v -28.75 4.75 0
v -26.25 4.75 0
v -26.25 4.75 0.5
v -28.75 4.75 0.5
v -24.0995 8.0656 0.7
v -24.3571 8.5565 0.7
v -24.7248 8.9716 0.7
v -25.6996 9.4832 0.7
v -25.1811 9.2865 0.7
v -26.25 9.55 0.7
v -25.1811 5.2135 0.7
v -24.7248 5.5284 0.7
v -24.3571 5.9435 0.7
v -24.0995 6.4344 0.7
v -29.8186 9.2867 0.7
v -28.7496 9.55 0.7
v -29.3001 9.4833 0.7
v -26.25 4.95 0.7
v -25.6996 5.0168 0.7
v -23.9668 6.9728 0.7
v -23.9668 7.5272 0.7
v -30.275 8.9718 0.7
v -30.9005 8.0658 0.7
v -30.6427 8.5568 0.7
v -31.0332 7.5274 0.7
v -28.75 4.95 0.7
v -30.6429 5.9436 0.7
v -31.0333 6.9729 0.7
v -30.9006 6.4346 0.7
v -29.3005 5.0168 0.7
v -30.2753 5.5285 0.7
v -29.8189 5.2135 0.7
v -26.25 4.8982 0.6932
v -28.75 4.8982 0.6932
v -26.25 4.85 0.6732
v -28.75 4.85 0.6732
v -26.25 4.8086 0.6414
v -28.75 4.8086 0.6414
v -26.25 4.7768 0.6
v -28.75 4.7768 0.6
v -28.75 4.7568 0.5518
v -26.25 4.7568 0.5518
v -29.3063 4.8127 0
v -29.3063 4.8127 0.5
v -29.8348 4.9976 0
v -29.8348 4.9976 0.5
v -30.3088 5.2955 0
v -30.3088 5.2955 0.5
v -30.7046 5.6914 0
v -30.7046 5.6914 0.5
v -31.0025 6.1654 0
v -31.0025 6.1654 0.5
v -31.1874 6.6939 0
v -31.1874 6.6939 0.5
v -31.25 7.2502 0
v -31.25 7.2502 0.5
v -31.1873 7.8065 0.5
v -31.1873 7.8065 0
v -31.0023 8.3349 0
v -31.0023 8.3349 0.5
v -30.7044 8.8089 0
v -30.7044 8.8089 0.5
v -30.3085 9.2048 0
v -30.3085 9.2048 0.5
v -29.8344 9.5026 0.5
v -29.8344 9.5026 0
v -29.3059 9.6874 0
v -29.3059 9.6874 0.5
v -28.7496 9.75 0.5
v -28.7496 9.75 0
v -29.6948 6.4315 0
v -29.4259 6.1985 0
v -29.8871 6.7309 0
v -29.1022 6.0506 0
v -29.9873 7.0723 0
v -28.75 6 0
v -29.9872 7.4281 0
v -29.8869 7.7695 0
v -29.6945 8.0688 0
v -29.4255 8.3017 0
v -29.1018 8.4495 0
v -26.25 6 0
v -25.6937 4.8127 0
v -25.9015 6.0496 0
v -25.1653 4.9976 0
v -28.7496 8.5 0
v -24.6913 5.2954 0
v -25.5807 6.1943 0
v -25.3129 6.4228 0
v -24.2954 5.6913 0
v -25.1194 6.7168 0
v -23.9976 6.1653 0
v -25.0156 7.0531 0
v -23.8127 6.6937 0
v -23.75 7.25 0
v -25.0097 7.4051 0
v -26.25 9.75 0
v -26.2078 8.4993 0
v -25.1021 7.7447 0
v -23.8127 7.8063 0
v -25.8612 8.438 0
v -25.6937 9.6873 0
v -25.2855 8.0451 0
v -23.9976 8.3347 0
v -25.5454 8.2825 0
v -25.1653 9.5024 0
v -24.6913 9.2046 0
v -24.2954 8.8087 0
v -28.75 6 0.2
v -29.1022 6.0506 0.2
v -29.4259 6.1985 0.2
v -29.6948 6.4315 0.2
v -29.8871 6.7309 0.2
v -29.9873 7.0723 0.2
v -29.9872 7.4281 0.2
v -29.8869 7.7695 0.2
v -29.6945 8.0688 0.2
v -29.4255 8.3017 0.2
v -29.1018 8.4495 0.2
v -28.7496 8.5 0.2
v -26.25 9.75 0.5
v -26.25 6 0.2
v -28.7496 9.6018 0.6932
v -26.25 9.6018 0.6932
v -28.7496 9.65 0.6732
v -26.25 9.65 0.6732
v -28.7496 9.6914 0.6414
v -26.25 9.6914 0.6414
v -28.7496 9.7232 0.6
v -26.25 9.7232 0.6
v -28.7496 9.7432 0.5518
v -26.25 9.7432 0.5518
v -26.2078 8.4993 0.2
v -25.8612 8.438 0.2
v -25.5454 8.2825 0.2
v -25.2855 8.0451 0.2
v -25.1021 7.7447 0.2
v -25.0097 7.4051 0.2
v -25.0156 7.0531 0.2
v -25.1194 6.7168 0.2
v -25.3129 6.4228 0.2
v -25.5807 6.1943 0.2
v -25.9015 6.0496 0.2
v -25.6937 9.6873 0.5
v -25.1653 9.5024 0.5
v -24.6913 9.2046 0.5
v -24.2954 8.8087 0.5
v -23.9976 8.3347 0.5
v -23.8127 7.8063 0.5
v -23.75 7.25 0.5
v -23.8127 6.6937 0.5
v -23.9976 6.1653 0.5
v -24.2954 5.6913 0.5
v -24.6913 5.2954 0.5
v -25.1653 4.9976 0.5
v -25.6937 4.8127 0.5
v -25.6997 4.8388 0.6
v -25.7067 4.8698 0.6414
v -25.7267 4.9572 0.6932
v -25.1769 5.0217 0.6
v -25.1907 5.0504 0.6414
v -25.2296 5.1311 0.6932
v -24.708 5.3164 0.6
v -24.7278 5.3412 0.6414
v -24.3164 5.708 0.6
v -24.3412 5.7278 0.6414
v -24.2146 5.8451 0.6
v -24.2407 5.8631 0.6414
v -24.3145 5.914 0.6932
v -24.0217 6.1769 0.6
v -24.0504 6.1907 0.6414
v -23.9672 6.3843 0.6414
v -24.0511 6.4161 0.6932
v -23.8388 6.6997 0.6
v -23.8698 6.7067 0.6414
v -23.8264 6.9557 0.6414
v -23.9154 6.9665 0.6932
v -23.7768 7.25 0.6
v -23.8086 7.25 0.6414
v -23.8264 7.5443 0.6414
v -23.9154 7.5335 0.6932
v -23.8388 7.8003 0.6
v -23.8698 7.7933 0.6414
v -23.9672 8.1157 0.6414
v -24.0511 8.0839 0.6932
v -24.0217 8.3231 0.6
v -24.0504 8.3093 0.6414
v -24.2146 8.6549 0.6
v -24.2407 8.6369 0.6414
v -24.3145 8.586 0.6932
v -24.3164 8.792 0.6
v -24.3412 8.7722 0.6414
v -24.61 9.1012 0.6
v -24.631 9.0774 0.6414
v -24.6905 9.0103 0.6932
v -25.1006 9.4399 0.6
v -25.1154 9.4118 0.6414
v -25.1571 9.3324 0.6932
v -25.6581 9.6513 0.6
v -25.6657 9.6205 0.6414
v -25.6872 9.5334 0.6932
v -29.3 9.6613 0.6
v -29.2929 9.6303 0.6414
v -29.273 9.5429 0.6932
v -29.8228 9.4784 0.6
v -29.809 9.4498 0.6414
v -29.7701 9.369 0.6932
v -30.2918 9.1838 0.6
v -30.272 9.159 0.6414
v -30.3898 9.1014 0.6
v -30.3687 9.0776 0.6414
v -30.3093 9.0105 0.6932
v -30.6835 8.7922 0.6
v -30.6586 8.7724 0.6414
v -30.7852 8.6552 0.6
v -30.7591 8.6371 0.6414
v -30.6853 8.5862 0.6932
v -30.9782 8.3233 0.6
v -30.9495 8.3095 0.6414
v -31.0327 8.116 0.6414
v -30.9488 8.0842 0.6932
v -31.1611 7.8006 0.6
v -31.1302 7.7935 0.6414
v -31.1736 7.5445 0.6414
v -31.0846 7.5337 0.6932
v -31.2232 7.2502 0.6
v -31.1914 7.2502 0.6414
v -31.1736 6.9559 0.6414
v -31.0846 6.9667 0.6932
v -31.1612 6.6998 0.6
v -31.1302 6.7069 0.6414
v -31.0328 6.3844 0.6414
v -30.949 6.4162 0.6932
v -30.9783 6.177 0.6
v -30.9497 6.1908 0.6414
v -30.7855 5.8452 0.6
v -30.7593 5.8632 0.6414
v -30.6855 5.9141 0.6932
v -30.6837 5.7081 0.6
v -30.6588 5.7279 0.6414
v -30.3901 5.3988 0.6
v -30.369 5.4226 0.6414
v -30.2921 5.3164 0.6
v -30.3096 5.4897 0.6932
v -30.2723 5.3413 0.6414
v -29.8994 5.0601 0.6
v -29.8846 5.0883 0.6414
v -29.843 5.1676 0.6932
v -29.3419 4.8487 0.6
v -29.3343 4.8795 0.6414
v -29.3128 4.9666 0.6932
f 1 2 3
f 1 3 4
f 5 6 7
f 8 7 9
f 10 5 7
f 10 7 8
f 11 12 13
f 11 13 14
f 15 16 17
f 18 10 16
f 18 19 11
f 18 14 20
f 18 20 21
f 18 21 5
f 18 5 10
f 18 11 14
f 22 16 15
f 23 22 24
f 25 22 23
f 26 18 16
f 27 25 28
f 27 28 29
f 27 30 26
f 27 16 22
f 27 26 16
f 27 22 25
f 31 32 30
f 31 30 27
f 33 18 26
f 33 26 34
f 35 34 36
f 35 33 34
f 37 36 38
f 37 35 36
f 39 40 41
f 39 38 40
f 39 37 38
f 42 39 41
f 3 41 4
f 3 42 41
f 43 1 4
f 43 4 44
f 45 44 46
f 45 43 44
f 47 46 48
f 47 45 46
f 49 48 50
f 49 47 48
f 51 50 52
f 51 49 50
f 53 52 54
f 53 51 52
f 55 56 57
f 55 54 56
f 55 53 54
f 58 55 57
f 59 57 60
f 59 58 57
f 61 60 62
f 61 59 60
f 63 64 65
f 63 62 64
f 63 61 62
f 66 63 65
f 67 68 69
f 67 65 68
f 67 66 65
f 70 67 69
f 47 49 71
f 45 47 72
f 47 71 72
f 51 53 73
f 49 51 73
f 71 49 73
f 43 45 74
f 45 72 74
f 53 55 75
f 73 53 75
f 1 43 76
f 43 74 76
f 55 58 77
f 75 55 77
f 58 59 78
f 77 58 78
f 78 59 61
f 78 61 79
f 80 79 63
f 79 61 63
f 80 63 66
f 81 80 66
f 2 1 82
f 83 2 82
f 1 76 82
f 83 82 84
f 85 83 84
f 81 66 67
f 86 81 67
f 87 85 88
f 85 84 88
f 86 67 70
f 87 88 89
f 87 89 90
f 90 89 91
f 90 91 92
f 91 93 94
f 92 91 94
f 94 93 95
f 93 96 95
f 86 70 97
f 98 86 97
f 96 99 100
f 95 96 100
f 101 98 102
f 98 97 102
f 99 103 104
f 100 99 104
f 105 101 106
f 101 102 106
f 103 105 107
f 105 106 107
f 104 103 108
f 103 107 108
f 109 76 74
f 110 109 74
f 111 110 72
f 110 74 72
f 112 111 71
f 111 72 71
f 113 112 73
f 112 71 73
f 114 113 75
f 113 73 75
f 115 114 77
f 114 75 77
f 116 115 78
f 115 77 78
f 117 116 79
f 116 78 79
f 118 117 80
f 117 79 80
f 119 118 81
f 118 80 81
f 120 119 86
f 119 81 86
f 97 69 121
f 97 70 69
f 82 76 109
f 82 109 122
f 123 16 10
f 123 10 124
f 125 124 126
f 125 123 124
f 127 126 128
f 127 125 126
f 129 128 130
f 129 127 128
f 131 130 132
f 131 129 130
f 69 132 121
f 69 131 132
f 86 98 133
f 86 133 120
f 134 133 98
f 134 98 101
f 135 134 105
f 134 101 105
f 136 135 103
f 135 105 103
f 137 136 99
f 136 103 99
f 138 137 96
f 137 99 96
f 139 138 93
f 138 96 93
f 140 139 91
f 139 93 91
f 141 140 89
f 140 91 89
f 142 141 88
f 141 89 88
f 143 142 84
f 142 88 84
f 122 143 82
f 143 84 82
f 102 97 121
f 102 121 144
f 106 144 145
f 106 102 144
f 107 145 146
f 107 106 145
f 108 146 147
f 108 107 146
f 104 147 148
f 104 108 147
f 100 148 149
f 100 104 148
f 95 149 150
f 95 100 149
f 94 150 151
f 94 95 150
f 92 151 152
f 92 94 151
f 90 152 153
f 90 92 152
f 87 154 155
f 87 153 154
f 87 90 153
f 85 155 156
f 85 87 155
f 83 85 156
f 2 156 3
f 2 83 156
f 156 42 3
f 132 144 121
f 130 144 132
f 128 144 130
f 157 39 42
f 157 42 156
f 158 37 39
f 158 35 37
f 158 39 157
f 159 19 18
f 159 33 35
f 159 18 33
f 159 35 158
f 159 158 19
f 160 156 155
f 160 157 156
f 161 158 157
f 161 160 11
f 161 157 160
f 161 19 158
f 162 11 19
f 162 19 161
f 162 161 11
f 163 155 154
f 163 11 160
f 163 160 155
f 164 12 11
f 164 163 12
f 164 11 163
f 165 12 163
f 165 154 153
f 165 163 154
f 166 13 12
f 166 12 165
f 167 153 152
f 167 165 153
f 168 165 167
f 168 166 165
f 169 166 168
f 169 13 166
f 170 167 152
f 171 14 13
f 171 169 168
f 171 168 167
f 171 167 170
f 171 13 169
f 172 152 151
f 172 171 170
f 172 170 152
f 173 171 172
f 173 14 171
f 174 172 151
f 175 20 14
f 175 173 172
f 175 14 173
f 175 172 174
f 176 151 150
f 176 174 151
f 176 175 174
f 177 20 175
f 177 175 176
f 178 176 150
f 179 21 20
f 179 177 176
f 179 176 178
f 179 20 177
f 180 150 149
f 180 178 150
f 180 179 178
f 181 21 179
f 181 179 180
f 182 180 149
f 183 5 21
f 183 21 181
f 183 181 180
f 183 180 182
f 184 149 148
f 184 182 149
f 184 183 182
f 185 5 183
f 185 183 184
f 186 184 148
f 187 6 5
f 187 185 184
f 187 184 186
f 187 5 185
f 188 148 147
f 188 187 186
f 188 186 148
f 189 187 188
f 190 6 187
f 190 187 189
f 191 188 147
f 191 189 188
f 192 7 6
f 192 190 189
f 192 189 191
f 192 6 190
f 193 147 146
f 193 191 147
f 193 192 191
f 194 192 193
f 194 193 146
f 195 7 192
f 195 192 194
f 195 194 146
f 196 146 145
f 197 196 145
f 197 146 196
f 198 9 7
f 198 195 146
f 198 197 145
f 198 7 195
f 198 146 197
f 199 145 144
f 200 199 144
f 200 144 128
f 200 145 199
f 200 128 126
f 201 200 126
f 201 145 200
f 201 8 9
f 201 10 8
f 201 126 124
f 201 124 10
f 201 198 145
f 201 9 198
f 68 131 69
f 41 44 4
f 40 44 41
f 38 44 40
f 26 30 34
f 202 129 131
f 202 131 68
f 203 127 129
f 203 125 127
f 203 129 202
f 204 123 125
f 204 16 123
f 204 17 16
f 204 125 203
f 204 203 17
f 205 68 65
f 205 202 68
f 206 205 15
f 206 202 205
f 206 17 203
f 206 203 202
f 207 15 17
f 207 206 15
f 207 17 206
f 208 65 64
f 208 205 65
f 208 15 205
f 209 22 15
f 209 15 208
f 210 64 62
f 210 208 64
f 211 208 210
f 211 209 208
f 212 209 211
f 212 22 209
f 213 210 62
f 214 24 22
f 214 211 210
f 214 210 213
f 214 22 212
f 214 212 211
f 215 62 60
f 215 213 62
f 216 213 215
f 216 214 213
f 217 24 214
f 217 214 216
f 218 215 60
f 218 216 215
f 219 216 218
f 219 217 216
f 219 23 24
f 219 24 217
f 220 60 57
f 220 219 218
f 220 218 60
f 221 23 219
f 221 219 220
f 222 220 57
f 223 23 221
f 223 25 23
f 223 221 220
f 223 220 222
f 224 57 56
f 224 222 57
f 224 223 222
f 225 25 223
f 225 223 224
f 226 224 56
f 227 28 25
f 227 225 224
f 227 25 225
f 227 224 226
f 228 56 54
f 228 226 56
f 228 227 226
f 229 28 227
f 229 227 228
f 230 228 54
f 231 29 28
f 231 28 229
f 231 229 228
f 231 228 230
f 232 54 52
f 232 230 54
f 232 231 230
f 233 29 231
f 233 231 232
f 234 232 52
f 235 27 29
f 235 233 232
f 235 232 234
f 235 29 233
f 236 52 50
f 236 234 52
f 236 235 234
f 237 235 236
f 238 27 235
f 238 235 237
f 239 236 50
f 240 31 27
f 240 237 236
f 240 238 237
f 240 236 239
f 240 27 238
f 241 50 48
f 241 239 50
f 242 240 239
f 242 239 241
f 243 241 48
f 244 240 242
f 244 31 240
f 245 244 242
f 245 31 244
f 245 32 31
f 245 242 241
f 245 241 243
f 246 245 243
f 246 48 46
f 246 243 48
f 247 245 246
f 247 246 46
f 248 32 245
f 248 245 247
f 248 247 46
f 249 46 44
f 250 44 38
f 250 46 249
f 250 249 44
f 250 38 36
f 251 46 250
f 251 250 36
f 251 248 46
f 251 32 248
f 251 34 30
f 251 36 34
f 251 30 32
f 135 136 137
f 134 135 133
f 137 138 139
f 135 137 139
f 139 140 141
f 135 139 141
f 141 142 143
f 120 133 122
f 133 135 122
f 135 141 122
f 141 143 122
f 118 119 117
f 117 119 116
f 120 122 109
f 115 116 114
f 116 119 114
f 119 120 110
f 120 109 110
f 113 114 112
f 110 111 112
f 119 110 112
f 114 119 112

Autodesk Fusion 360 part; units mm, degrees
sketch "Sketch1" plane through (0, 0, 0) normal (0, 0, 1) x (1, 0, 0)
  line L0 (-30, 13) -> (-30, 5) construction
  line L1 (-25, 13) -> (-25, 5) construction
  line L2 (-32, 6) -> (-22, 6) construction
  line L3 (-28.75, 6) -> (-26.25, 6)
  line L4 (-26.2078, 8.4993) -> (-28.7496, 8.5)
  arc A0 (-26.25, 6) -> (-26.2915, 8.4993) centre (-26.25, 7.25) ccw
  arc A1 (-28.7496, 8.5) -> (-28.75, 6) centre (-28.75, 7.25) ccw
  line L5 (-28.7496, 9.75) -> (-26.25, 9.75)
  line L6 (-26.25, 4.75) -> (-28.75, 4.75)
  arc A2 (-26.25, 4.75) -> (-26.25, 9.75) centre (-26.25, 7.25) ccw
  arc A3 (-28.7496, 9.75) -> (-28.75, 4.75) centre (-28.75, 7.25) ccw
  dimension "d1" = 5
  dimension "d2" = 1.25
  dimension "d3" = 1.25
  dimension "d4" = 5
extrude "Extrude1" add sketch "Sketch1" along normal blind 0.2
sketch "Sketch2" plane through (0, 0, 0.2) normal (0, 0, 1) x (-1, 0, 0)
  arc A0 (28.7496, -8.5) -> (28.75, -6) centre (28.75, -7.25) ccw
  line L0 (28.7496, -8.5) -> (26.2915, -8.4993)
  arc A1 (26.25, -6) -> (26.2915, -8.4993) centre (26.25, -7.25) ccw
  line L1 (26.25, -6) -> (28.75, -6)
  arc A2 (26.25, -4.75) -> (26.25, -9.75) centre (26.25, -7.25) ccw
  line L2 (26.25, -9.75) -> (28.7496, -9.75)
  arc A3 (28.7496, -9.75) -> (28.75, -4.75) centre (28.75, -7.25) ccw
  line L3 (28.75, -4.75) -> (26.25, -4.75)
extrude "Extrude2" add sketch "Sketch2" along normal blind 0.5 contours A0 L0 A1 L1 | A2 L2 A3 L3
fillet "Fillet1" radius 0.2 4 edges at (-27.5, 4.75, 0.7) (-23.75, 7.25, 0.7) (-27.4998, 9.75, 0.7) (-31.25, 7.2502, 0.7)
